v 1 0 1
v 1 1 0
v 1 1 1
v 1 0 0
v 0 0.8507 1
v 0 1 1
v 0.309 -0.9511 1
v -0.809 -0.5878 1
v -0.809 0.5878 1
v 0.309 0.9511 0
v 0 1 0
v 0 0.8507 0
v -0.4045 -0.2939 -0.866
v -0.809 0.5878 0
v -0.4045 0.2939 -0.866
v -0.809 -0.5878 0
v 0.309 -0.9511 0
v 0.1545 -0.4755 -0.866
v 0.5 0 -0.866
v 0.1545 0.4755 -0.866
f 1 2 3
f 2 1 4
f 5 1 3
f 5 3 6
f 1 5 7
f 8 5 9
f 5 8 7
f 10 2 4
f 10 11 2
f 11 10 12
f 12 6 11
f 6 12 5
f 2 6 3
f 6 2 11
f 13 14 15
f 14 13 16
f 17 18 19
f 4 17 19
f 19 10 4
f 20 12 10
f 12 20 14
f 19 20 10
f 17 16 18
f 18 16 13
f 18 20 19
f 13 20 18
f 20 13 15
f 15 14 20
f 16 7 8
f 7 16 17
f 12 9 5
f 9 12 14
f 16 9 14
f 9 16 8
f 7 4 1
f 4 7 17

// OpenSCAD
inf = 1/0;
nan = inf / inf;
for(i=[1,0,-1,-inf,nan,inf]){
    echo(str("i=",i));
    cube([1,i,1]);
    sphere(i);
    cylinder(h=i);
    cylinder(r=i);
    square(i);
    square([1,i]);
    square([i,1]);
    circle(i);
}
